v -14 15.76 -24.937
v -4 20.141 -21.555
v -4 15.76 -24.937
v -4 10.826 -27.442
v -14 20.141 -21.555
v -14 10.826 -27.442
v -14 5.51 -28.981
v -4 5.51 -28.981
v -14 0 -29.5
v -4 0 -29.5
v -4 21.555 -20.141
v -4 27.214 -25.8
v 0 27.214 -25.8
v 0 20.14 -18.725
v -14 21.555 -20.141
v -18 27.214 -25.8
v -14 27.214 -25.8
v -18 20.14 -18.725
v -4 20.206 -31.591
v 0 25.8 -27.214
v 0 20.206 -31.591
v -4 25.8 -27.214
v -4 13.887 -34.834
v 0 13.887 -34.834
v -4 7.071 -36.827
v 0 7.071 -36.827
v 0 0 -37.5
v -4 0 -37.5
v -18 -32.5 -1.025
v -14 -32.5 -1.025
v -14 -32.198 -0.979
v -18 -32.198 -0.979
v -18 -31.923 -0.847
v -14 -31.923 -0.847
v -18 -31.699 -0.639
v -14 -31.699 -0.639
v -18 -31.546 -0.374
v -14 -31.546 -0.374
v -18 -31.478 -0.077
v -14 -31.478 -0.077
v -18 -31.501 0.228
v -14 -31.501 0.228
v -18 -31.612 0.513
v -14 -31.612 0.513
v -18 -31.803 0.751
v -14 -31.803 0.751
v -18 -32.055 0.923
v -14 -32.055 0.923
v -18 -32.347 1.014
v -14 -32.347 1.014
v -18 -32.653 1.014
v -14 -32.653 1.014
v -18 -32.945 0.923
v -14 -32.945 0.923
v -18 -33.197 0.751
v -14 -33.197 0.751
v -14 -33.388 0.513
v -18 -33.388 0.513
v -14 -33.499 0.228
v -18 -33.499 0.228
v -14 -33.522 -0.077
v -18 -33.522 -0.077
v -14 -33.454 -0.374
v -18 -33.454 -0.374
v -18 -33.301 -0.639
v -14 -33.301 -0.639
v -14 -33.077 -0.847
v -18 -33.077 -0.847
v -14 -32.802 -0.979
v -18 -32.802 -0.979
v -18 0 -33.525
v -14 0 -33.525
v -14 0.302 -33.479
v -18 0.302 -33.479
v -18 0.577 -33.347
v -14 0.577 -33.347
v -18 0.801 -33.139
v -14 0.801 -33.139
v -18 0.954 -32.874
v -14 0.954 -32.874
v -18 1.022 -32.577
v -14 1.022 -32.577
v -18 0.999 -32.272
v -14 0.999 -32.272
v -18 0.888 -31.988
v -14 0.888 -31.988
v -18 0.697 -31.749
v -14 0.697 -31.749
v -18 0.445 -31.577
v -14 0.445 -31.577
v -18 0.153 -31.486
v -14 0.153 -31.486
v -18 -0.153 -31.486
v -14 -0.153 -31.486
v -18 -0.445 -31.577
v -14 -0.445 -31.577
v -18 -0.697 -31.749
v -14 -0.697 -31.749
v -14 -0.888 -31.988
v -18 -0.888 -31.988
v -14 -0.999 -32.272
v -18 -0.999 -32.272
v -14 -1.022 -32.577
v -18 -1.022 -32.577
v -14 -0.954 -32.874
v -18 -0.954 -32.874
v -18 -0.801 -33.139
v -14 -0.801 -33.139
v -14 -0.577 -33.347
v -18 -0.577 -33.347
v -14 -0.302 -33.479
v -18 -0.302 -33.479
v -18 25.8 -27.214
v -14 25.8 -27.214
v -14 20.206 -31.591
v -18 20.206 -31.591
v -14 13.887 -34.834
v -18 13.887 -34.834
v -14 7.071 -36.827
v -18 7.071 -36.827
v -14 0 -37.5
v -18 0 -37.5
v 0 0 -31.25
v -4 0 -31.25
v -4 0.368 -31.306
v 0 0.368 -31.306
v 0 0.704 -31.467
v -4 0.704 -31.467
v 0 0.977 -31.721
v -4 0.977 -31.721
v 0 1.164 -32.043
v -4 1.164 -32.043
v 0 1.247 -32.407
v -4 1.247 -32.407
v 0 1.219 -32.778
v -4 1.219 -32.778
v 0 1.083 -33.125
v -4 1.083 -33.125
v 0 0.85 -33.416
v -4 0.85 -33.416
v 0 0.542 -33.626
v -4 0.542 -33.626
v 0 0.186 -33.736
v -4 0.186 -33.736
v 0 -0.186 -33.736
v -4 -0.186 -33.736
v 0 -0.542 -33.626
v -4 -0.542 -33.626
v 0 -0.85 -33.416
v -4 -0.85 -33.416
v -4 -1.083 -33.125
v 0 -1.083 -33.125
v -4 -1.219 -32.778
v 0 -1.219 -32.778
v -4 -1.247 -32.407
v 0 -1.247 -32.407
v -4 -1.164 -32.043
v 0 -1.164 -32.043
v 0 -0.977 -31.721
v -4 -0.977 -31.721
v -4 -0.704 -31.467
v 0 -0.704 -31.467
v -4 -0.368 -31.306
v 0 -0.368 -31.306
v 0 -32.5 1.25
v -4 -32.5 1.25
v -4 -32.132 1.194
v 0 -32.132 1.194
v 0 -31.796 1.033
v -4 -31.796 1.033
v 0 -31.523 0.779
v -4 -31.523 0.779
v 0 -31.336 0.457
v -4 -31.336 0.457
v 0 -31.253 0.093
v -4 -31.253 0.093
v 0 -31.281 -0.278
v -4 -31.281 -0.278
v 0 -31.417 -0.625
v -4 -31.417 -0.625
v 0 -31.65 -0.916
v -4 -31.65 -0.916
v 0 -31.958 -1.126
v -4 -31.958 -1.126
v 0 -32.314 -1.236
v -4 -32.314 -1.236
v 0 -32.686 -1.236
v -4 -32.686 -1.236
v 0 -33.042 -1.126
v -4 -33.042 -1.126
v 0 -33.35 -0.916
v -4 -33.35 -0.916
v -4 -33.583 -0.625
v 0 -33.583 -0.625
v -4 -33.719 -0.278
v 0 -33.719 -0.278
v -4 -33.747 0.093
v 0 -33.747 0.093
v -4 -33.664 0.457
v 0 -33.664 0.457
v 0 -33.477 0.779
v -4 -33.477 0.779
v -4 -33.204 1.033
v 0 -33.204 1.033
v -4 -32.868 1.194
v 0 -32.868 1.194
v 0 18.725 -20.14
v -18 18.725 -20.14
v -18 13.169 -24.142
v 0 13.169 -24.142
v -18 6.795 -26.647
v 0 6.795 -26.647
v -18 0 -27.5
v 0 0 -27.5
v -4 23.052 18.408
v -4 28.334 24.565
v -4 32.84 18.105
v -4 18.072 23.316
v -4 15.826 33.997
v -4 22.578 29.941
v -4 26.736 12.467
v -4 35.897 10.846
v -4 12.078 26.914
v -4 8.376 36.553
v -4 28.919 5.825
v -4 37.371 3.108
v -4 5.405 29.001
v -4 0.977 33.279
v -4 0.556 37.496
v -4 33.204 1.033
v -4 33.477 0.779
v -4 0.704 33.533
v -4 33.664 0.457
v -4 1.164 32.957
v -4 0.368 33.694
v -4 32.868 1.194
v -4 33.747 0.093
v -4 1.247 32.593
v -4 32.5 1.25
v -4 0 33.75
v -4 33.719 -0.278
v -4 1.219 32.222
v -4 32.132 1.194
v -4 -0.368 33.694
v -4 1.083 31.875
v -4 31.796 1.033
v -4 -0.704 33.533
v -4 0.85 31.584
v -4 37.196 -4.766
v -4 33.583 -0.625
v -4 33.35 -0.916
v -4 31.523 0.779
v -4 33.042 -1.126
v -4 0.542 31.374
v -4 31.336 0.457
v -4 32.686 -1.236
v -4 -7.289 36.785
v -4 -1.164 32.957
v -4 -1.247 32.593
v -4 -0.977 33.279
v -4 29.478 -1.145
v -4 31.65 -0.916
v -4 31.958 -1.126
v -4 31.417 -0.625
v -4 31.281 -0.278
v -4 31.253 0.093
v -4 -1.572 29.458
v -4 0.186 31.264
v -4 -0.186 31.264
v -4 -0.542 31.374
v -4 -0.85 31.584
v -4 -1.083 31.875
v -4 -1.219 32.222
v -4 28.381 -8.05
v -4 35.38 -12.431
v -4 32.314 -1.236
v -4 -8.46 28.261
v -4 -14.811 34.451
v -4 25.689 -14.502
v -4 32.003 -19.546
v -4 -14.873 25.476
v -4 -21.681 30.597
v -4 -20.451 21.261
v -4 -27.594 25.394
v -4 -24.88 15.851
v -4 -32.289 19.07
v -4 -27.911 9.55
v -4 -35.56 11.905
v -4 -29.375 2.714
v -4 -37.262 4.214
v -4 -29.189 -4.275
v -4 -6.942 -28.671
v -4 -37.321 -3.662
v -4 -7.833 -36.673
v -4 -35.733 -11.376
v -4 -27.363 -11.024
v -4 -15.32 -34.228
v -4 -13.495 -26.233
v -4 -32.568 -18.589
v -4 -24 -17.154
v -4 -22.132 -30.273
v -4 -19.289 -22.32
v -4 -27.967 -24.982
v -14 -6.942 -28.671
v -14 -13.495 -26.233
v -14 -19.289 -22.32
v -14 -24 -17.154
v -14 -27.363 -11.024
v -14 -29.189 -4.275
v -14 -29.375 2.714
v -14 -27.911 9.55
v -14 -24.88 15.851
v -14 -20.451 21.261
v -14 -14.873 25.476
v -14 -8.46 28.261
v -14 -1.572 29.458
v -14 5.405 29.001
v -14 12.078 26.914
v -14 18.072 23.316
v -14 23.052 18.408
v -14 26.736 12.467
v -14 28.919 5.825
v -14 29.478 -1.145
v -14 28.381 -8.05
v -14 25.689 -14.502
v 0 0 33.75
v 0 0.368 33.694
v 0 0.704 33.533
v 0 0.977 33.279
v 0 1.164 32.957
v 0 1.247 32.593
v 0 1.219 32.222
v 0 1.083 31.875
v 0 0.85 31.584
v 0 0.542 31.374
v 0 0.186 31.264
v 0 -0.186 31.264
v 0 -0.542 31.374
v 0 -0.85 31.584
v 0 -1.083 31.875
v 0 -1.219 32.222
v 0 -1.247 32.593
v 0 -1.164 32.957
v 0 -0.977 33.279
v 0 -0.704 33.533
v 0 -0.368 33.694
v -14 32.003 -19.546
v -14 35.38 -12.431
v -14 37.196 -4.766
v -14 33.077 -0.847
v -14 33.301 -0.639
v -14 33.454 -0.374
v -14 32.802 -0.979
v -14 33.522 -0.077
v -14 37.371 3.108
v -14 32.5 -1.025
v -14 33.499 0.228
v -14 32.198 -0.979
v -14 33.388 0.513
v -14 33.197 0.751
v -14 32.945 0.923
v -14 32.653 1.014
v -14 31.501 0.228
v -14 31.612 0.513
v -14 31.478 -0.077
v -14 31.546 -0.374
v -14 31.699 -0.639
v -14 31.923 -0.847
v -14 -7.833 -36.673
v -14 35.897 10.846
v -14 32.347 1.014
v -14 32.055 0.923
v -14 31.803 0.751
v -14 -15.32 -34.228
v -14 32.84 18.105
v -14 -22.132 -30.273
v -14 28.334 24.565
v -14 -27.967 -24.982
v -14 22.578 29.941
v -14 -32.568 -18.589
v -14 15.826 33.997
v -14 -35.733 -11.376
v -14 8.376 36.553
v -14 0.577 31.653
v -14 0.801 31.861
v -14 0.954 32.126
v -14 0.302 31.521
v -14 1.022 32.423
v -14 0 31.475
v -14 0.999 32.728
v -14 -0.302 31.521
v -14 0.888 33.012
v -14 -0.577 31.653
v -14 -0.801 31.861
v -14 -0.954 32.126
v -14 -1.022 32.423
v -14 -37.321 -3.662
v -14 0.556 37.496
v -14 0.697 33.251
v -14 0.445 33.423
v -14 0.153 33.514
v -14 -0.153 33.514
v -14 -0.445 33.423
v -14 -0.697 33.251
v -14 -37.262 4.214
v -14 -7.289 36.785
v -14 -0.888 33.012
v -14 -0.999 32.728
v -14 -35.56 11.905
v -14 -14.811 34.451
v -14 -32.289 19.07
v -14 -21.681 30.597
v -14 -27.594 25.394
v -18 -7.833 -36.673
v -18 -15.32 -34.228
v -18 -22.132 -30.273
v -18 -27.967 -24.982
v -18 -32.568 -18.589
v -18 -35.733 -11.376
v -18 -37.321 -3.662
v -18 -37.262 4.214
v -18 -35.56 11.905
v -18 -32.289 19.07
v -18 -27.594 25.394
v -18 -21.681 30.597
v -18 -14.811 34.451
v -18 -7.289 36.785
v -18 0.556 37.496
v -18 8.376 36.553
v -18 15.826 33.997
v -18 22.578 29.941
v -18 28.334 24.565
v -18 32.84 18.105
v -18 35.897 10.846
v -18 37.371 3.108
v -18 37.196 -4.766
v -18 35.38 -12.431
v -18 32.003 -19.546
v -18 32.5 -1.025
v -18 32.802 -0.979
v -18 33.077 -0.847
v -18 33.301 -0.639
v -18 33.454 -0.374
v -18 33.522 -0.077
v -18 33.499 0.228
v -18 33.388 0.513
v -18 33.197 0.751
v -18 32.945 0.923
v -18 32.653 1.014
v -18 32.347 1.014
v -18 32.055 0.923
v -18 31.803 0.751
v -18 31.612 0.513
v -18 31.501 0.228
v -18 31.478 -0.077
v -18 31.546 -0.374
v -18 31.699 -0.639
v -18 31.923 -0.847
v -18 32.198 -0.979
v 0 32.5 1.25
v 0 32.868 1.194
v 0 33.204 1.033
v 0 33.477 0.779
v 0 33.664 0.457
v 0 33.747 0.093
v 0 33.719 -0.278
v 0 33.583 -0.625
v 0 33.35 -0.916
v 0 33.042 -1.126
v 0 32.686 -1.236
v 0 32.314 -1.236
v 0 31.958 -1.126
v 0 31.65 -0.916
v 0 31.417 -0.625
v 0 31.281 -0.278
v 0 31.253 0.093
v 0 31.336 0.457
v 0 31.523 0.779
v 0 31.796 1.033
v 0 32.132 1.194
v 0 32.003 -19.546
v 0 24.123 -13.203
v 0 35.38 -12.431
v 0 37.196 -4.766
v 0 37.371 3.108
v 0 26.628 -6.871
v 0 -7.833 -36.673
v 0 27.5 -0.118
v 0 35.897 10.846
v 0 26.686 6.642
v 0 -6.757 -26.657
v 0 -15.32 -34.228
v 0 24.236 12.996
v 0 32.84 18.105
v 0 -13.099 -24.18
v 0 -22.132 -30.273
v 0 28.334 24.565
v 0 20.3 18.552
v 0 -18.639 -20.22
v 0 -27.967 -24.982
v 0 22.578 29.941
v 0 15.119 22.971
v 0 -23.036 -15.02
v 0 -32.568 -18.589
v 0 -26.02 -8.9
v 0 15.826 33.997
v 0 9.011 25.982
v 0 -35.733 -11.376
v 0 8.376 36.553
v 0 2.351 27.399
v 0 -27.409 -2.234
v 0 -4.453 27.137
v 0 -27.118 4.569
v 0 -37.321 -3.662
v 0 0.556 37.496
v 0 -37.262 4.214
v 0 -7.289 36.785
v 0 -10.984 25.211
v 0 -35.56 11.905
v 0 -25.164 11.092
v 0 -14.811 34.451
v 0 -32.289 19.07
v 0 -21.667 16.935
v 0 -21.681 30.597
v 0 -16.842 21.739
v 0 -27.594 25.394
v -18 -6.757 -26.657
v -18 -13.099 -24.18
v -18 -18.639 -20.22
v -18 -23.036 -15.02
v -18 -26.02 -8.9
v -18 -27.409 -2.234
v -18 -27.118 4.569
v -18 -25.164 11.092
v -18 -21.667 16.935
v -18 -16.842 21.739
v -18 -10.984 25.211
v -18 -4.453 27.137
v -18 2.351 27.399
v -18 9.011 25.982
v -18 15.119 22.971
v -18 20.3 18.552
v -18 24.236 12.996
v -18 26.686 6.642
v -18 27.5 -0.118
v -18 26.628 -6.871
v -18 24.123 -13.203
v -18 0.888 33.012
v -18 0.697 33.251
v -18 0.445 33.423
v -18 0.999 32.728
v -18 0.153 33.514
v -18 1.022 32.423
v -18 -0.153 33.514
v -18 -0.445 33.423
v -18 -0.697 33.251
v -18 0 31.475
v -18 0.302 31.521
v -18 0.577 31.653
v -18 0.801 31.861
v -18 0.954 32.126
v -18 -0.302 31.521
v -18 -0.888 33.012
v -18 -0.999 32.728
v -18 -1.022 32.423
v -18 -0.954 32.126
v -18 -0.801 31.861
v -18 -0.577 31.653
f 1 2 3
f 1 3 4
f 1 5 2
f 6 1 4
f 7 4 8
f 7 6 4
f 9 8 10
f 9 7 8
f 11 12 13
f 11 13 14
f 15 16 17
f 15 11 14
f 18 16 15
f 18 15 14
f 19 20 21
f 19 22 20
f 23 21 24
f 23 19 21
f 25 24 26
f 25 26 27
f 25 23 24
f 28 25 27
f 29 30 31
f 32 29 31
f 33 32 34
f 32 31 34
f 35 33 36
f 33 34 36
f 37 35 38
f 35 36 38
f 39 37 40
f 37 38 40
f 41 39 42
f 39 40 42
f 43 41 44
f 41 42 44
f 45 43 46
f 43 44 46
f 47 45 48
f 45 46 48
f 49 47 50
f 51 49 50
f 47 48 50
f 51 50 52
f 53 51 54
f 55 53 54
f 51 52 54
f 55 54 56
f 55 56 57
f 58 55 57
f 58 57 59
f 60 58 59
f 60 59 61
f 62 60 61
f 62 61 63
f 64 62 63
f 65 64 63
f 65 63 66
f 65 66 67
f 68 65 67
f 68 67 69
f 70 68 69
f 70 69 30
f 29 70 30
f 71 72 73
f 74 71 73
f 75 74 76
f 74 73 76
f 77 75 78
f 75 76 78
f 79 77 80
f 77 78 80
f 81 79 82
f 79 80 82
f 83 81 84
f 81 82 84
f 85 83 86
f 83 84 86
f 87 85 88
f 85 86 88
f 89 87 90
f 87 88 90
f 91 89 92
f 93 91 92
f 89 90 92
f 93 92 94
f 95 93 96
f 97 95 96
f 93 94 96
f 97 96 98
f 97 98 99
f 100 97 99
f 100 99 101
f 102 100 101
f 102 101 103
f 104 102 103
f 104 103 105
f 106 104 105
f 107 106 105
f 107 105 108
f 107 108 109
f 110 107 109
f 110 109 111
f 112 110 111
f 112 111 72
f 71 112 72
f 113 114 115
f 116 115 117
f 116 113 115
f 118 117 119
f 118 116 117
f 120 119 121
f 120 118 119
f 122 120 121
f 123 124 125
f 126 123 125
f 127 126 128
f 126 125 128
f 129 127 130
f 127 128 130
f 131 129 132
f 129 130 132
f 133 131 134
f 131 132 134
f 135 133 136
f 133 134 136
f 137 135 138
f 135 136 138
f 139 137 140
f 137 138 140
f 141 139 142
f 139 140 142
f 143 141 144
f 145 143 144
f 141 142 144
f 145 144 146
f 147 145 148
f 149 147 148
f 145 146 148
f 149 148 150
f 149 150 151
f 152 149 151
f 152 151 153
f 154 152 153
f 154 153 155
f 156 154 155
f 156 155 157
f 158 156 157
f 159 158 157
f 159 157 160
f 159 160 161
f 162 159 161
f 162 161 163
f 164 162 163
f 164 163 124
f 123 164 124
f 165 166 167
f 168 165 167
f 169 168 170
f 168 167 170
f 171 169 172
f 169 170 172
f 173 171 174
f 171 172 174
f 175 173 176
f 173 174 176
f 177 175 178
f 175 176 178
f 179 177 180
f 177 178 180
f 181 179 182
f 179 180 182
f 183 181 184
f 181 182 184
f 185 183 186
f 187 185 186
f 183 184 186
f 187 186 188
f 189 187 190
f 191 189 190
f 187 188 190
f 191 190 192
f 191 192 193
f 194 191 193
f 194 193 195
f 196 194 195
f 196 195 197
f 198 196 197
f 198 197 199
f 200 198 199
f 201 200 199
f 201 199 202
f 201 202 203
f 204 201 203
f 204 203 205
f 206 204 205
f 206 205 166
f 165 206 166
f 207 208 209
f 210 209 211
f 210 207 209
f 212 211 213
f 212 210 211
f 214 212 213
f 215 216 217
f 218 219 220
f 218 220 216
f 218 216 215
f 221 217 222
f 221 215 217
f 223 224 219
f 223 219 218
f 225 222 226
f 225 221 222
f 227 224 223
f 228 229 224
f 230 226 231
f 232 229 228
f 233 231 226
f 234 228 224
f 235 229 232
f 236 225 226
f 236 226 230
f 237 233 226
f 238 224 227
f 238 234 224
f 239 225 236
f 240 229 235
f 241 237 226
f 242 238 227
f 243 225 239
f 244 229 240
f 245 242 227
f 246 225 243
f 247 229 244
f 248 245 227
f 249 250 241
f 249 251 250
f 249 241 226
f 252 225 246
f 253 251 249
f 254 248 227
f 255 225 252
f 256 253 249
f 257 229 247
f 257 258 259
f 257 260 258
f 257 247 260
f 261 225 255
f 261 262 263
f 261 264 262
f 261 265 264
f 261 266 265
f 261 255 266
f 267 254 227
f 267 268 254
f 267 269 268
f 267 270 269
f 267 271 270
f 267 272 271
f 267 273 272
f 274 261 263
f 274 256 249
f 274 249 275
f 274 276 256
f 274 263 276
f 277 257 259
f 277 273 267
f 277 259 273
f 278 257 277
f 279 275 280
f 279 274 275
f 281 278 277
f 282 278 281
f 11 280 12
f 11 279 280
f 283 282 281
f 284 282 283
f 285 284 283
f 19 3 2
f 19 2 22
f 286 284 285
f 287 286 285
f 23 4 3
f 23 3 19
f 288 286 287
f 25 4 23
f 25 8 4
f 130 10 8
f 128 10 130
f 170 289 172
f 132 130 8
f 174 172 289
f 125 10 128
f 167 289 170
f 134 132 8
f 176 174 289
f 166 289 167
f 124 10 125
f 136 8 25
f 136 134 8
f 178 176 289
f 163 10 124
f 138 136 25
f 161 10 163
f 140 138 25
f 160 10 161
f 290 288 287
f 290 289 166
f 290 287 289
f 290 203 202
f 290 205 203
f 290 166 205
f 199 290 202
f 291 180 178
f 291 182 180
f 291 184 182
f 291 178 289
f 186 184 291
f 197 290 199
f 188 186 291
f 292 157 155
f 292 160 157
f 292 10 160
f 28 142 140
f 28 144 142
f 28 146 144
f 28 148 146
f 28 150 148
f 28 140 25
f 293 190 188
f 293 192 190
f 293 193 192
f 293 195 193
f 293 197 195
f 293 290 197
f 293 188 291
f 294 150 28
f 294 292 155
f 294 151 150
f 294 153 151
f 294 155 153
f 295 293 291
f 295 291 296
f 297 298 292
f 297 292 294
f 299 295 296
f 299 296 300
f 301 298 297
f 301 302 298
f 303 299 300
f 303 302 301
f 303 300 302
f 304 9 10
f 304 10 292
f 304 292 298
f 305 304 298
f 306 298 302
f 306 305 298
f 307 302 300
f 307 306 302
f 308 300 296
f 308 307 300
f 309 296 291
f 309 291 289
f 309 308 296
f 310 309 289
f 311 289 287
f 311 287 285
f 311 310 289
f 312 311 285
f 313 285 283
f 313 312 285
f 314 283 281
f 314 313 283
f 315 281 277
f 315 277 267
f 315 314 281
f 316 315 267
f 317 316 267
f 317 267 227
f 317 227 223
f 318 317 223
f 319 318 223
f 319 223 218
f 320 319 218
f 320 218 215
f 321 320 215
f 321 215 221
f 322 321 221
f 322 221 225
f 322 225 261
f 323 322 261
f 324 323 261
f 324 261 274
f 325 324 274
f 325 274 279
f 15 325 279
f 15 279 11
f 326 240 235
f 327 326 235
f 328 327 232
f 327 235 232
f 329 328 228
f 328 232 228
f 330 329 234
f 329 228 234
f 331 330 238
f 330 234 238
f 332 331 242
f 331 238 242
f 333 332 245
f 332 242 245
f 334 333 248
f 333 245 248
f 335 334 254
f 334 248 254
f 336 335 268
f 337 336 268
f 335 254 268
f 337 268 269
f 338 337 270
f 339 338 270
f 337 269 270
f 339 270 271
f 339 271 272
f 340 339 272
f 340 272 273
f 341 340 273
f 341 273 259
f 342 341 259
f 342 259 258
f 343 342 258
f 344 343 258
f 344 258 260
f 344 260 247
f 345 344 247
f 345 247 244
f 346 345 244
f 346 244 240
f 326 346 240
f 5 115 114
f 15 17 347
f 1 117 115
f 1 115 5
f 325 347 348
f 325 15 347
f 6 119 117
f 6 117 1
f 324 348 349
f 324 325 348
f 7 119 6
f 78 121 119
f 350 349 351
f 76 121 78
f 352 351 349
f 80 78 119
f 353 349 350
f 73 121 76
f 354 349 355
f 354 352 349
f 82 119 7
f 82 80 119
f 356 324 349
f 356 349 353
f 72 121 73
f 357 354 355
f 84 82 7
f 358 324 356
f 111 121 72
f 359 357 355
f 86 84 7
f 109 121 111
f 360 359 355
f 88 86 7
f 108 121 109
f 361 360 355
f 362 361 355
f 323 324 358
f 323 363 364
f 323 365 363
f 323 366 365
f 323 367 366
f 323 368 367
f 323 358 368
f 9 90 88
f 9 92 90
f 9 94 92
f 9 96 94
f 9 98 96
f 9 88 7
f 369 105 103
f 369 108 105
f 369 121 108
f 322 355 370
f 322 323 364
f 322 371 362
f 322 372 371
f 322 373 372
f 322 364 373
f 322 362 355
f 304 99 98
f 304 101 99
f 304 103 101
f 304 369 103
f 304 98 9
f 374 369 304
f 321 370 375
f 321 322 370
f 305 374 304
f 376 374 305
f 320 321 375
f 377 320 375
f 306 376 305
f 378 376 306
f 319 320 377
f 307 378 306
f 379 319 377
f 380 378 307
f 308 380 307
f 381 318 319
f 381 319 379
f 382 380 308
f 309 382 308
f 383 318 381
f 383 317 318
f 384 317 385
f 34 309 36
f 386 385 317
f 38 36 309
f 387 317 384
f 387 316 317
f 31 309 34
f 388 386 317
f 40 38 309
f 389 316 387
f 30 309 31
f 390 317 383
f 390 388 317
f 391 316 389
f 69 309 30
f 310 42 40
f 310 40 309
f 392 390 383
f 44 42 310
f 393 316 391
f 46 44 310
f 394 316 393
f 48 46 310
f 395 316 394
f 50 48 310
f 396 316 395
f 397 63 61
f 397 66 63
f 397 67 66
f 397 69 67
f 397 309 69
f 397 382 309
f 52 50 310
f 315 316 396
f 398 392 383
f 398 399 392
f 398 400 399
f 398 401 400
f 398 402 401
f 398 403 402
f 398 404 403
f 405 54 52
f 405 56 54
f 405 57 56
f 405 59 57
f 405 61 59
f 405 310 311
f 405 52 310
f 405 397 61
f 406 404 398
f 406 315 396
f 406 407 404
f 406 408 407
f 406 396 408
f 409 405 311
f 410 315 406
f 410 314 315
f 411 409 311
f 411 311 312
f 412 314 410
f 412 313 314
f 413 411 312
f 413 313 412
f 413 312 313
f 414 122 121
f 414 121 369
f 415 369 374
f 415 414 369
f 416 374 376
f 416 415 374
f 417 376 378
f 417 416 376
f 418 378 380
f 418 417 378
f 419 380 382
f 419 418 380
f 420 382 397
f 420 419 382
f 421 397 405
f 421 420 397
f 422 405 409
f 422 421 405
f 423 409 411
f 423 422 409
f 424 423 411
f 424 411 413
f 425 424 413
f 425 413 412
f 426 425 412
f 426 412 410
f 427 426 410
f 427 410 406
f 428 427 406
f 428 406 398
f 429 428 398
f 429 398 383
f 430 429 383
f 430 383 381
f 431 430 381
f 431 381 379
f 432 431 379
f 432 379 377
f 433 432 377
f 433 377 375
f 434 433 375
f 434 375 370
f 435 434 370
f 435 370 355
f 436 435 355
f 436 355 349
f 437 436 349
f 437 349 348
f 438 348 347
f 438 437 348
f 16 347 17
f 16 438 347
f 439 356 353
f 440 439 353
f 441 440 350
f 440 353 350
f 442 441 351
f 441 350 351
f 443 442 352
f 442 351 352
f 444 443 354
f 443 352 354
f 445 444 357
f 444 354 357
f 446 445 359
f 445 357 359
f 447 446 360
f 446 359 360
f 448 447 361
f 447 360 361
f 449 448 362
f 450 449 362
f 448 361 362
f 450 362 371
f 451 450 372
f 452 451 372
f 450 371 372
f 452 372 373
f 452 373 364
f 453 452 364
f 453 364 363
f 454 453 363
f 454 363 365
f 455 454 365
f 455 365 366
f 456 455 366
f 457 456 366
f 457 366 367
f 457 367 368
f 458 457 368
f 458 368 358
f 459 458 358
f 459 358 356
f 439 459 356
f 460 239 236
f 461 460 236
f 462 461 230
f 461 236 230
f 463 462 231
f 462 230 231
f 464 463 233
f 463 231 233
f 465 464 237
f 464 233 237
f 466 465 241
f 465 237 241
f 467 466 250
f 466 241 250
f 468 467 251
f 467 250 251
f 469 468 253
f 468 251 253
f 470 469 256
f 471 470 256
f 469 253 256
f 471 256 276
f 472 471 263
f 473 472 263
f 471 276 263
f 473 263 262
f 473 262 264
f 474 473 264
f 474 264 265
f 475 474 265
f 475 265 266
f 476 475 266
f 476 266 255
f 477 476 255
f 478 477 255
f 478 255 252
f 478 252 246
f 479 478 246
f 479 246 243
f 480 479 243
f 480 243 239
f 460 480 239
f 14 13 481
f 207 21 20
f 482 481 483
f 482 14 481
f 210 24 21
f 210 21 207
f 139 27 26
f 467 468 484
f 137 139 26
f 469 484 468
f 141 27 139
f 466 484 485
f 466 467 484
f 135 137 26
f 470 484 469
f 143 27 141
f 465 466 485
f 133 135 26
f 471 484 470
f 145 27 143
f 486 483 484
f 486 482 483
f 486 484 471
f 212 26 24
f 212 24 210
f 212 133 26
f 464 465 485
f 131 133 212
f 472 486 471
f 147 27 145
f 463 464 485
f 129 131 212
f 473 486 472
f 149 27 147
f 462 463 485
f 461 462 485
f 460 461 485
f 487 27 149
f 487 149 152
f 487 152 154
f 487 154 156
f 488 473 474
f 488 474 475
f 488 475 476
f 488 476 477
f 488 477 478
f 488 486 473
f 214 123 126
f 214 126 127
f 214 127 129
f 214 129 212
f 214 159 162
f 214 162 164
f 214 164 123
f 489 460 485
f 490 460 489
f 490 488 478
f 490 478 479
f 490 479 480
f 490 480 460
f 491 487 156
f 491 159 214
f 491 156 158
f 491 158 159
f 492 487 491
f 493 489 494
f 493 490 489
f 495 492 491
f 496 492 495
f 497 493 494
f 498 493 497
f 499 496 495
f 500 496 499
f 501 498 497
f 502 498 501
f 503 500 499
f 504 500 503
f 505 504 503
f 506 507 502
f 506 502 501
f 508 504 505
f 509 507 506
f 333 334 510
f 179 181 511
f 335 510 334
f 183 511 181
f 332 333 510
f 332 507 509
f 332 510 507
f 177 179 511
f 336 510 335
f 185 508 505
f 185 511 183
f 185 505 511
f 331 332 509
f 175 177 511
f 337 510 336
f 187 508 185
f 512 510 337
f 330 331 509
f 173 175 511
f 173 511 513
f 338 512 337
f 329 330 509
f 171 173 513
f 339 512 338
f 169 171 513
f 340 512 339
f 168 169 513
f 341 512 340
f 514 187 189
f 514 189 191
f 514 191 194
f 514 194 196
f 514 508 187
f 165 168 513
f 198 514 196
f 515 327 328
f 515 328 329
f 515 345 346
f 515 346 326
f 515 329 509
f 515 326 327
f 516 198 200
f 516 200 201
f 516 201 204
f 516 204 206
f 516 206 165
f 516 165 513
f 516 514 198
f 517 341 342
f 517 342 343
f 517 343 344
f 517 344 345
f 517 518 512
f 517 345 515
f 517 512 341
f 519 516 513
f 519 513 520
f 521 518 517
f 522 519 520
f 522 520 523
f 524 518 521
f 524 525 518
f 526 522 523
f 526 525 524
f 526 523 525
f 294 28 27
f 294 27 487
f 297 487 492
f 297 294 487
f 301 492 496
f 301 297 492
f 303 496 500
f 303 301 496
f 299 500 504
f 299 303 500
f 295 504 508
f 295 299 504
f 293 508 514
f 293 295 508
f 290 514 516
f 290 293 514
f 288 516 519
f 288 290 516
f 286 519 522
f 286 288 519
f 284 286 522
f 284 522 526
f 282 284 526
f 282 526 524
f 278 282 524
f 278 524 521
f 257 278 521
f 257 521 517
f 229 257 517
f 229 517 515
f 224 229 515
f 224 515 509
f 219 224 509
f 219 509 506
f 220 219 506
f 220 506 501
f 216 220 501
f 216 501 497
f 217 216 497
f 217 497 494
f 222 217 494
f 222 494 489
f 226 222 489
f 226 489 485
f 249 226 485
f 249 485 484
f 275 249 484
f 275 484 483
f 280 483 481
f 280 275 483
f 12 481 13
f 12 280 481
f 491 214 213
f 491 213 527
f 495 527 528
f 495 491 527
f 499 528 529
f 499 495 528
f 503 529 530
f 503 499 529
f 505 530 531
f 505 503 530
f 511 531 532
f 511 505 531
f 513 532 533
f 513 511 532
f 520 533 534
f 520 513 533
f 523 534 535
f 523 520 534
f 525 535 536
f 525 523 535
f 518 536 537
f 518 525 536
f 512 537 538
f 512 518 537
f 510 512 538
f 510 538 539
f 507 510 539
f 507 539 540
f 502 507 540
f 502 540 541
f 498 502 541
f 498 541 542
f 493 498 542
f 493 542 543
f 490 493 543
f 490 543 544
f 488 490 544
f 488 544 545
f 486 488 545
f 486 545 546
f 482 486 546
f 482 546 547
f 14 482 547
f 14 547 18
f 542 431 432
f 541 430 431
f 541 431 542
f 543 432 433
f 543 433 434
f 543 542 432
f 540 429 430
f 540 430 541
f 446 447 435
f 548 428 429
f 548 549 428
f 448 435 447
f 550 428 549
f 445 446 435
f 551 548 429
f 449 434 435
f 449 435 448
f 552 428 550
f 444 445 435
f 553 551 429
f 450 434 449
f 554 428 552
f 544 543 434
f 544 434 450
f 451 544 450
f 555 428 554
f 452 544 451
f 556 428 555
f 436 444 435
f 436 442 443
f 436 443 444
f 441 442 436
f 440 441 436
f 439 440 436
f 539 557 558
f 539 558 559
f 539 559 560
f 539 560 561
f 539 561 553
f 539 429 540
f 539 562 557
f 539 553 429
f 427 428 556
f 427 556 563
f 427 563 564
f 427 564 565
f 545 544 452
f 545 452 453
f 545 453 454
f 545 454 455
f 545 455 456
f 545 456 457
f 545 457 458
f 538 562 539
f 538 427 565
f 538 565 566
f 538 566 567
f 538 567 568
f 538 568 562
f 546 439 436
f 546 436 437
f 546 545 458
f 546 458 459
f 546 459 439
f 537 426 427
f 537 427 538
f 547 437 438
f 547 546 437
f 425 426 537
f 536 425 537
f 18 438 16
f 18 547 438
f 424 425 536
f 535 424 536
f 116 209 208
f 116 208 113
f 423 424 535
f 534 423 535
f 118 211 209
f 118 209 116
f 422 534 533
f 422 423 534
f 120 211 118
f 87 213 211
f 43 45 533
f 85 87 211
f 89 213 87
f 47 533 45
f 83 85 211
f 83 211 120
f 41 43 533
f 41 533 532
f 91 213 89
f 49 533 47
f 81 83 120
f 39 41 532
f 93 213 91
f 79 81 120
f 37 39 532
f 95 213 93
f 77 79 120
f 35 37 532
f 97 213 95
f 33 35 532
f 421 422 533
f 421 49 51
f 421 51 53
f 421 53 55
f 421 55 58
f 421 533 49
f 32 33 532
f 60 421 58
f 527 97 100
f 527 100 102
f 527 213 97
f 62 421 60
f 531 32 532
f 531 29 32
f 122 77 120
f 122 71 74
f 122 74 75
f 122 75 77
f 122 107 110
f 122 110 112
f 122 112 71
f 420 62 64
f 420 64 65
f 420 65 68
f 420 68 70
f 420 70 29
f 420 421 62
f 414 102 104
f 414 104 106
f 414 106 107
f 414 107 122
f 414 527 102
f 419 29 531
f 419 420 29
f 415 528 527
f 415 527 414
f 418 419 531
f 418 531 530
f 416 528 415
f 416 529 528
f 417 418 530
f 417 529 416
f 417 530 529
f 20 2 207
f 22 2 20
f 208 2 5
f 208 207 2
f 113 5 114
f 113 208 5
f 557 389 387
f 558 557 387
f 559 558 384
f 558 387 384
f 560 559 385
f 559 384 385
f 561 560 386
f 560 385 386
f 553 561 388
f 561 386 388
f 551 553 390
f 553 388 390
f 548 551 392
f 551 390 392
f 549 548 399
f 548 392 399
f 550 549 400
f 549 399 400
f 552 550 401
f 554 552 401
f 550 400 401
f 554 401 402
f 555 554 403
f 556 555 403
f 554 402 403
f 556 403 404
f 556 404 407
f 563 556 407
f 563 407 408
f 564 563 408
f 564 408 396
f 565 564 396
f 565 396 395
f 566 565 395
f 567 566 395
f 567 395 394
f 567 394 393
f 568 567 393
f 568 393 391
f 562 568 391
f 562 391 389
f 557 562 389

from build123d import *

# Parameters (mm, degrees)
M2_5X0_45_TAPPED_HOLE2_D     = 2.05
M2_5X0_45_TAPPED_HOLE2_DEPTH = 6.35
M2_5X0_45_TAPPED_HOLE2_TIP   = 0.615882135
M3X0_5_TAPPED_HOLE1_D        = 2.5
M3X0_5_TAPPED_HOLE1_DEPTH    = 7.5
M3X0_5_TAPPED_HOLE1_TIP      = 0.751075774
CUT_EXTRUDE1_DEPTH           = 57.004464108


with BuildPart() as part:
    # Sketch1 → Revolve1 (revolve)
    with BuildSketch(Plane.XY, mode=Mode.PRIVATE) as revolve1_sk:
        Polygon((-18, 27.5), (0, 27.5), (0, 37.5), (-4, 37.5), (-4, 29.5), (-14, 29.5), (-14, 37.5), (-18, 37.5), align=None)
    revolve(revolve1_sk.sketch.rotate(Axis((0, 0, 0), (-1, 0, 0)), 90), axis=Axis((0, 0, 0), (-1, 0, 0)))

    # M2.5x0.45 Tapped Hole2
    with Locations(Plane.ZY.offset(18)):
        with Locations((0, -32.5), (-32.5, 0), (32.5, 0), (0, 32.5)):
            Hole(M2_5X0_45_TAPPED_HOLE2_D / 2, depth=M2_5X0_45_TAPPED_HOLE2_DEPTH)
            with Locations((0, 0, -(M2_5X0_45_TAPPED_HOLE2_DEPTH + M2_5X0_45_TAPPED_HOLE2_TIP / 2))):  # 118° drill point
                Cone(0, M2_5X0_45_TAPPED_HOLE2_D / 2, M2_5X0_45_TAPPED_HOLE2_TIP, mode=Mode.SUBTRACT)

    # M3x0.5 Tapped Hole1
    with Locations(Plane(origin=(0, 0, 0), x_dir=(0, 0, -1), z_dir=(1, 0, 0))):
        with Locations((-32.5, 0), (0, -32.5), (32.5, 0), (0, 32.5)):
            Hole(M3X0_5_TAPPED_HOLE1_D / 2, depth=M3X0_5_TAPPED_HOLE1_DEPTH)
            with Locations((0, 0, -(M3X0_5_TAPPED_HOLE1_DEPTH + M3X0_5_TAPPED_HOLE1_TIP / 2))):  # 118° drill point
                Cone(0, M3X0_5_TAPPED_HOLE1_D / 2, M3X0_5_TAPPED_HOLE1_TIP, mode=Mode.SUBTRACT)

    # Sketch8 → Cut-Extrude1 (cut, through all)
    with BuildSketch(Plane.ZY.offset(18)):
        Polygon((-27.223611076, 25.809397513), (-25.809397513, 27.223611076), (-18.725468962, 20.139682524), (-20.139682524, 18.725468962), align=None)
    extrude(amount=-CUT_EXTRUDE1_DEPTH, mode=Mode.SUBTRACT)


solid = part.part
